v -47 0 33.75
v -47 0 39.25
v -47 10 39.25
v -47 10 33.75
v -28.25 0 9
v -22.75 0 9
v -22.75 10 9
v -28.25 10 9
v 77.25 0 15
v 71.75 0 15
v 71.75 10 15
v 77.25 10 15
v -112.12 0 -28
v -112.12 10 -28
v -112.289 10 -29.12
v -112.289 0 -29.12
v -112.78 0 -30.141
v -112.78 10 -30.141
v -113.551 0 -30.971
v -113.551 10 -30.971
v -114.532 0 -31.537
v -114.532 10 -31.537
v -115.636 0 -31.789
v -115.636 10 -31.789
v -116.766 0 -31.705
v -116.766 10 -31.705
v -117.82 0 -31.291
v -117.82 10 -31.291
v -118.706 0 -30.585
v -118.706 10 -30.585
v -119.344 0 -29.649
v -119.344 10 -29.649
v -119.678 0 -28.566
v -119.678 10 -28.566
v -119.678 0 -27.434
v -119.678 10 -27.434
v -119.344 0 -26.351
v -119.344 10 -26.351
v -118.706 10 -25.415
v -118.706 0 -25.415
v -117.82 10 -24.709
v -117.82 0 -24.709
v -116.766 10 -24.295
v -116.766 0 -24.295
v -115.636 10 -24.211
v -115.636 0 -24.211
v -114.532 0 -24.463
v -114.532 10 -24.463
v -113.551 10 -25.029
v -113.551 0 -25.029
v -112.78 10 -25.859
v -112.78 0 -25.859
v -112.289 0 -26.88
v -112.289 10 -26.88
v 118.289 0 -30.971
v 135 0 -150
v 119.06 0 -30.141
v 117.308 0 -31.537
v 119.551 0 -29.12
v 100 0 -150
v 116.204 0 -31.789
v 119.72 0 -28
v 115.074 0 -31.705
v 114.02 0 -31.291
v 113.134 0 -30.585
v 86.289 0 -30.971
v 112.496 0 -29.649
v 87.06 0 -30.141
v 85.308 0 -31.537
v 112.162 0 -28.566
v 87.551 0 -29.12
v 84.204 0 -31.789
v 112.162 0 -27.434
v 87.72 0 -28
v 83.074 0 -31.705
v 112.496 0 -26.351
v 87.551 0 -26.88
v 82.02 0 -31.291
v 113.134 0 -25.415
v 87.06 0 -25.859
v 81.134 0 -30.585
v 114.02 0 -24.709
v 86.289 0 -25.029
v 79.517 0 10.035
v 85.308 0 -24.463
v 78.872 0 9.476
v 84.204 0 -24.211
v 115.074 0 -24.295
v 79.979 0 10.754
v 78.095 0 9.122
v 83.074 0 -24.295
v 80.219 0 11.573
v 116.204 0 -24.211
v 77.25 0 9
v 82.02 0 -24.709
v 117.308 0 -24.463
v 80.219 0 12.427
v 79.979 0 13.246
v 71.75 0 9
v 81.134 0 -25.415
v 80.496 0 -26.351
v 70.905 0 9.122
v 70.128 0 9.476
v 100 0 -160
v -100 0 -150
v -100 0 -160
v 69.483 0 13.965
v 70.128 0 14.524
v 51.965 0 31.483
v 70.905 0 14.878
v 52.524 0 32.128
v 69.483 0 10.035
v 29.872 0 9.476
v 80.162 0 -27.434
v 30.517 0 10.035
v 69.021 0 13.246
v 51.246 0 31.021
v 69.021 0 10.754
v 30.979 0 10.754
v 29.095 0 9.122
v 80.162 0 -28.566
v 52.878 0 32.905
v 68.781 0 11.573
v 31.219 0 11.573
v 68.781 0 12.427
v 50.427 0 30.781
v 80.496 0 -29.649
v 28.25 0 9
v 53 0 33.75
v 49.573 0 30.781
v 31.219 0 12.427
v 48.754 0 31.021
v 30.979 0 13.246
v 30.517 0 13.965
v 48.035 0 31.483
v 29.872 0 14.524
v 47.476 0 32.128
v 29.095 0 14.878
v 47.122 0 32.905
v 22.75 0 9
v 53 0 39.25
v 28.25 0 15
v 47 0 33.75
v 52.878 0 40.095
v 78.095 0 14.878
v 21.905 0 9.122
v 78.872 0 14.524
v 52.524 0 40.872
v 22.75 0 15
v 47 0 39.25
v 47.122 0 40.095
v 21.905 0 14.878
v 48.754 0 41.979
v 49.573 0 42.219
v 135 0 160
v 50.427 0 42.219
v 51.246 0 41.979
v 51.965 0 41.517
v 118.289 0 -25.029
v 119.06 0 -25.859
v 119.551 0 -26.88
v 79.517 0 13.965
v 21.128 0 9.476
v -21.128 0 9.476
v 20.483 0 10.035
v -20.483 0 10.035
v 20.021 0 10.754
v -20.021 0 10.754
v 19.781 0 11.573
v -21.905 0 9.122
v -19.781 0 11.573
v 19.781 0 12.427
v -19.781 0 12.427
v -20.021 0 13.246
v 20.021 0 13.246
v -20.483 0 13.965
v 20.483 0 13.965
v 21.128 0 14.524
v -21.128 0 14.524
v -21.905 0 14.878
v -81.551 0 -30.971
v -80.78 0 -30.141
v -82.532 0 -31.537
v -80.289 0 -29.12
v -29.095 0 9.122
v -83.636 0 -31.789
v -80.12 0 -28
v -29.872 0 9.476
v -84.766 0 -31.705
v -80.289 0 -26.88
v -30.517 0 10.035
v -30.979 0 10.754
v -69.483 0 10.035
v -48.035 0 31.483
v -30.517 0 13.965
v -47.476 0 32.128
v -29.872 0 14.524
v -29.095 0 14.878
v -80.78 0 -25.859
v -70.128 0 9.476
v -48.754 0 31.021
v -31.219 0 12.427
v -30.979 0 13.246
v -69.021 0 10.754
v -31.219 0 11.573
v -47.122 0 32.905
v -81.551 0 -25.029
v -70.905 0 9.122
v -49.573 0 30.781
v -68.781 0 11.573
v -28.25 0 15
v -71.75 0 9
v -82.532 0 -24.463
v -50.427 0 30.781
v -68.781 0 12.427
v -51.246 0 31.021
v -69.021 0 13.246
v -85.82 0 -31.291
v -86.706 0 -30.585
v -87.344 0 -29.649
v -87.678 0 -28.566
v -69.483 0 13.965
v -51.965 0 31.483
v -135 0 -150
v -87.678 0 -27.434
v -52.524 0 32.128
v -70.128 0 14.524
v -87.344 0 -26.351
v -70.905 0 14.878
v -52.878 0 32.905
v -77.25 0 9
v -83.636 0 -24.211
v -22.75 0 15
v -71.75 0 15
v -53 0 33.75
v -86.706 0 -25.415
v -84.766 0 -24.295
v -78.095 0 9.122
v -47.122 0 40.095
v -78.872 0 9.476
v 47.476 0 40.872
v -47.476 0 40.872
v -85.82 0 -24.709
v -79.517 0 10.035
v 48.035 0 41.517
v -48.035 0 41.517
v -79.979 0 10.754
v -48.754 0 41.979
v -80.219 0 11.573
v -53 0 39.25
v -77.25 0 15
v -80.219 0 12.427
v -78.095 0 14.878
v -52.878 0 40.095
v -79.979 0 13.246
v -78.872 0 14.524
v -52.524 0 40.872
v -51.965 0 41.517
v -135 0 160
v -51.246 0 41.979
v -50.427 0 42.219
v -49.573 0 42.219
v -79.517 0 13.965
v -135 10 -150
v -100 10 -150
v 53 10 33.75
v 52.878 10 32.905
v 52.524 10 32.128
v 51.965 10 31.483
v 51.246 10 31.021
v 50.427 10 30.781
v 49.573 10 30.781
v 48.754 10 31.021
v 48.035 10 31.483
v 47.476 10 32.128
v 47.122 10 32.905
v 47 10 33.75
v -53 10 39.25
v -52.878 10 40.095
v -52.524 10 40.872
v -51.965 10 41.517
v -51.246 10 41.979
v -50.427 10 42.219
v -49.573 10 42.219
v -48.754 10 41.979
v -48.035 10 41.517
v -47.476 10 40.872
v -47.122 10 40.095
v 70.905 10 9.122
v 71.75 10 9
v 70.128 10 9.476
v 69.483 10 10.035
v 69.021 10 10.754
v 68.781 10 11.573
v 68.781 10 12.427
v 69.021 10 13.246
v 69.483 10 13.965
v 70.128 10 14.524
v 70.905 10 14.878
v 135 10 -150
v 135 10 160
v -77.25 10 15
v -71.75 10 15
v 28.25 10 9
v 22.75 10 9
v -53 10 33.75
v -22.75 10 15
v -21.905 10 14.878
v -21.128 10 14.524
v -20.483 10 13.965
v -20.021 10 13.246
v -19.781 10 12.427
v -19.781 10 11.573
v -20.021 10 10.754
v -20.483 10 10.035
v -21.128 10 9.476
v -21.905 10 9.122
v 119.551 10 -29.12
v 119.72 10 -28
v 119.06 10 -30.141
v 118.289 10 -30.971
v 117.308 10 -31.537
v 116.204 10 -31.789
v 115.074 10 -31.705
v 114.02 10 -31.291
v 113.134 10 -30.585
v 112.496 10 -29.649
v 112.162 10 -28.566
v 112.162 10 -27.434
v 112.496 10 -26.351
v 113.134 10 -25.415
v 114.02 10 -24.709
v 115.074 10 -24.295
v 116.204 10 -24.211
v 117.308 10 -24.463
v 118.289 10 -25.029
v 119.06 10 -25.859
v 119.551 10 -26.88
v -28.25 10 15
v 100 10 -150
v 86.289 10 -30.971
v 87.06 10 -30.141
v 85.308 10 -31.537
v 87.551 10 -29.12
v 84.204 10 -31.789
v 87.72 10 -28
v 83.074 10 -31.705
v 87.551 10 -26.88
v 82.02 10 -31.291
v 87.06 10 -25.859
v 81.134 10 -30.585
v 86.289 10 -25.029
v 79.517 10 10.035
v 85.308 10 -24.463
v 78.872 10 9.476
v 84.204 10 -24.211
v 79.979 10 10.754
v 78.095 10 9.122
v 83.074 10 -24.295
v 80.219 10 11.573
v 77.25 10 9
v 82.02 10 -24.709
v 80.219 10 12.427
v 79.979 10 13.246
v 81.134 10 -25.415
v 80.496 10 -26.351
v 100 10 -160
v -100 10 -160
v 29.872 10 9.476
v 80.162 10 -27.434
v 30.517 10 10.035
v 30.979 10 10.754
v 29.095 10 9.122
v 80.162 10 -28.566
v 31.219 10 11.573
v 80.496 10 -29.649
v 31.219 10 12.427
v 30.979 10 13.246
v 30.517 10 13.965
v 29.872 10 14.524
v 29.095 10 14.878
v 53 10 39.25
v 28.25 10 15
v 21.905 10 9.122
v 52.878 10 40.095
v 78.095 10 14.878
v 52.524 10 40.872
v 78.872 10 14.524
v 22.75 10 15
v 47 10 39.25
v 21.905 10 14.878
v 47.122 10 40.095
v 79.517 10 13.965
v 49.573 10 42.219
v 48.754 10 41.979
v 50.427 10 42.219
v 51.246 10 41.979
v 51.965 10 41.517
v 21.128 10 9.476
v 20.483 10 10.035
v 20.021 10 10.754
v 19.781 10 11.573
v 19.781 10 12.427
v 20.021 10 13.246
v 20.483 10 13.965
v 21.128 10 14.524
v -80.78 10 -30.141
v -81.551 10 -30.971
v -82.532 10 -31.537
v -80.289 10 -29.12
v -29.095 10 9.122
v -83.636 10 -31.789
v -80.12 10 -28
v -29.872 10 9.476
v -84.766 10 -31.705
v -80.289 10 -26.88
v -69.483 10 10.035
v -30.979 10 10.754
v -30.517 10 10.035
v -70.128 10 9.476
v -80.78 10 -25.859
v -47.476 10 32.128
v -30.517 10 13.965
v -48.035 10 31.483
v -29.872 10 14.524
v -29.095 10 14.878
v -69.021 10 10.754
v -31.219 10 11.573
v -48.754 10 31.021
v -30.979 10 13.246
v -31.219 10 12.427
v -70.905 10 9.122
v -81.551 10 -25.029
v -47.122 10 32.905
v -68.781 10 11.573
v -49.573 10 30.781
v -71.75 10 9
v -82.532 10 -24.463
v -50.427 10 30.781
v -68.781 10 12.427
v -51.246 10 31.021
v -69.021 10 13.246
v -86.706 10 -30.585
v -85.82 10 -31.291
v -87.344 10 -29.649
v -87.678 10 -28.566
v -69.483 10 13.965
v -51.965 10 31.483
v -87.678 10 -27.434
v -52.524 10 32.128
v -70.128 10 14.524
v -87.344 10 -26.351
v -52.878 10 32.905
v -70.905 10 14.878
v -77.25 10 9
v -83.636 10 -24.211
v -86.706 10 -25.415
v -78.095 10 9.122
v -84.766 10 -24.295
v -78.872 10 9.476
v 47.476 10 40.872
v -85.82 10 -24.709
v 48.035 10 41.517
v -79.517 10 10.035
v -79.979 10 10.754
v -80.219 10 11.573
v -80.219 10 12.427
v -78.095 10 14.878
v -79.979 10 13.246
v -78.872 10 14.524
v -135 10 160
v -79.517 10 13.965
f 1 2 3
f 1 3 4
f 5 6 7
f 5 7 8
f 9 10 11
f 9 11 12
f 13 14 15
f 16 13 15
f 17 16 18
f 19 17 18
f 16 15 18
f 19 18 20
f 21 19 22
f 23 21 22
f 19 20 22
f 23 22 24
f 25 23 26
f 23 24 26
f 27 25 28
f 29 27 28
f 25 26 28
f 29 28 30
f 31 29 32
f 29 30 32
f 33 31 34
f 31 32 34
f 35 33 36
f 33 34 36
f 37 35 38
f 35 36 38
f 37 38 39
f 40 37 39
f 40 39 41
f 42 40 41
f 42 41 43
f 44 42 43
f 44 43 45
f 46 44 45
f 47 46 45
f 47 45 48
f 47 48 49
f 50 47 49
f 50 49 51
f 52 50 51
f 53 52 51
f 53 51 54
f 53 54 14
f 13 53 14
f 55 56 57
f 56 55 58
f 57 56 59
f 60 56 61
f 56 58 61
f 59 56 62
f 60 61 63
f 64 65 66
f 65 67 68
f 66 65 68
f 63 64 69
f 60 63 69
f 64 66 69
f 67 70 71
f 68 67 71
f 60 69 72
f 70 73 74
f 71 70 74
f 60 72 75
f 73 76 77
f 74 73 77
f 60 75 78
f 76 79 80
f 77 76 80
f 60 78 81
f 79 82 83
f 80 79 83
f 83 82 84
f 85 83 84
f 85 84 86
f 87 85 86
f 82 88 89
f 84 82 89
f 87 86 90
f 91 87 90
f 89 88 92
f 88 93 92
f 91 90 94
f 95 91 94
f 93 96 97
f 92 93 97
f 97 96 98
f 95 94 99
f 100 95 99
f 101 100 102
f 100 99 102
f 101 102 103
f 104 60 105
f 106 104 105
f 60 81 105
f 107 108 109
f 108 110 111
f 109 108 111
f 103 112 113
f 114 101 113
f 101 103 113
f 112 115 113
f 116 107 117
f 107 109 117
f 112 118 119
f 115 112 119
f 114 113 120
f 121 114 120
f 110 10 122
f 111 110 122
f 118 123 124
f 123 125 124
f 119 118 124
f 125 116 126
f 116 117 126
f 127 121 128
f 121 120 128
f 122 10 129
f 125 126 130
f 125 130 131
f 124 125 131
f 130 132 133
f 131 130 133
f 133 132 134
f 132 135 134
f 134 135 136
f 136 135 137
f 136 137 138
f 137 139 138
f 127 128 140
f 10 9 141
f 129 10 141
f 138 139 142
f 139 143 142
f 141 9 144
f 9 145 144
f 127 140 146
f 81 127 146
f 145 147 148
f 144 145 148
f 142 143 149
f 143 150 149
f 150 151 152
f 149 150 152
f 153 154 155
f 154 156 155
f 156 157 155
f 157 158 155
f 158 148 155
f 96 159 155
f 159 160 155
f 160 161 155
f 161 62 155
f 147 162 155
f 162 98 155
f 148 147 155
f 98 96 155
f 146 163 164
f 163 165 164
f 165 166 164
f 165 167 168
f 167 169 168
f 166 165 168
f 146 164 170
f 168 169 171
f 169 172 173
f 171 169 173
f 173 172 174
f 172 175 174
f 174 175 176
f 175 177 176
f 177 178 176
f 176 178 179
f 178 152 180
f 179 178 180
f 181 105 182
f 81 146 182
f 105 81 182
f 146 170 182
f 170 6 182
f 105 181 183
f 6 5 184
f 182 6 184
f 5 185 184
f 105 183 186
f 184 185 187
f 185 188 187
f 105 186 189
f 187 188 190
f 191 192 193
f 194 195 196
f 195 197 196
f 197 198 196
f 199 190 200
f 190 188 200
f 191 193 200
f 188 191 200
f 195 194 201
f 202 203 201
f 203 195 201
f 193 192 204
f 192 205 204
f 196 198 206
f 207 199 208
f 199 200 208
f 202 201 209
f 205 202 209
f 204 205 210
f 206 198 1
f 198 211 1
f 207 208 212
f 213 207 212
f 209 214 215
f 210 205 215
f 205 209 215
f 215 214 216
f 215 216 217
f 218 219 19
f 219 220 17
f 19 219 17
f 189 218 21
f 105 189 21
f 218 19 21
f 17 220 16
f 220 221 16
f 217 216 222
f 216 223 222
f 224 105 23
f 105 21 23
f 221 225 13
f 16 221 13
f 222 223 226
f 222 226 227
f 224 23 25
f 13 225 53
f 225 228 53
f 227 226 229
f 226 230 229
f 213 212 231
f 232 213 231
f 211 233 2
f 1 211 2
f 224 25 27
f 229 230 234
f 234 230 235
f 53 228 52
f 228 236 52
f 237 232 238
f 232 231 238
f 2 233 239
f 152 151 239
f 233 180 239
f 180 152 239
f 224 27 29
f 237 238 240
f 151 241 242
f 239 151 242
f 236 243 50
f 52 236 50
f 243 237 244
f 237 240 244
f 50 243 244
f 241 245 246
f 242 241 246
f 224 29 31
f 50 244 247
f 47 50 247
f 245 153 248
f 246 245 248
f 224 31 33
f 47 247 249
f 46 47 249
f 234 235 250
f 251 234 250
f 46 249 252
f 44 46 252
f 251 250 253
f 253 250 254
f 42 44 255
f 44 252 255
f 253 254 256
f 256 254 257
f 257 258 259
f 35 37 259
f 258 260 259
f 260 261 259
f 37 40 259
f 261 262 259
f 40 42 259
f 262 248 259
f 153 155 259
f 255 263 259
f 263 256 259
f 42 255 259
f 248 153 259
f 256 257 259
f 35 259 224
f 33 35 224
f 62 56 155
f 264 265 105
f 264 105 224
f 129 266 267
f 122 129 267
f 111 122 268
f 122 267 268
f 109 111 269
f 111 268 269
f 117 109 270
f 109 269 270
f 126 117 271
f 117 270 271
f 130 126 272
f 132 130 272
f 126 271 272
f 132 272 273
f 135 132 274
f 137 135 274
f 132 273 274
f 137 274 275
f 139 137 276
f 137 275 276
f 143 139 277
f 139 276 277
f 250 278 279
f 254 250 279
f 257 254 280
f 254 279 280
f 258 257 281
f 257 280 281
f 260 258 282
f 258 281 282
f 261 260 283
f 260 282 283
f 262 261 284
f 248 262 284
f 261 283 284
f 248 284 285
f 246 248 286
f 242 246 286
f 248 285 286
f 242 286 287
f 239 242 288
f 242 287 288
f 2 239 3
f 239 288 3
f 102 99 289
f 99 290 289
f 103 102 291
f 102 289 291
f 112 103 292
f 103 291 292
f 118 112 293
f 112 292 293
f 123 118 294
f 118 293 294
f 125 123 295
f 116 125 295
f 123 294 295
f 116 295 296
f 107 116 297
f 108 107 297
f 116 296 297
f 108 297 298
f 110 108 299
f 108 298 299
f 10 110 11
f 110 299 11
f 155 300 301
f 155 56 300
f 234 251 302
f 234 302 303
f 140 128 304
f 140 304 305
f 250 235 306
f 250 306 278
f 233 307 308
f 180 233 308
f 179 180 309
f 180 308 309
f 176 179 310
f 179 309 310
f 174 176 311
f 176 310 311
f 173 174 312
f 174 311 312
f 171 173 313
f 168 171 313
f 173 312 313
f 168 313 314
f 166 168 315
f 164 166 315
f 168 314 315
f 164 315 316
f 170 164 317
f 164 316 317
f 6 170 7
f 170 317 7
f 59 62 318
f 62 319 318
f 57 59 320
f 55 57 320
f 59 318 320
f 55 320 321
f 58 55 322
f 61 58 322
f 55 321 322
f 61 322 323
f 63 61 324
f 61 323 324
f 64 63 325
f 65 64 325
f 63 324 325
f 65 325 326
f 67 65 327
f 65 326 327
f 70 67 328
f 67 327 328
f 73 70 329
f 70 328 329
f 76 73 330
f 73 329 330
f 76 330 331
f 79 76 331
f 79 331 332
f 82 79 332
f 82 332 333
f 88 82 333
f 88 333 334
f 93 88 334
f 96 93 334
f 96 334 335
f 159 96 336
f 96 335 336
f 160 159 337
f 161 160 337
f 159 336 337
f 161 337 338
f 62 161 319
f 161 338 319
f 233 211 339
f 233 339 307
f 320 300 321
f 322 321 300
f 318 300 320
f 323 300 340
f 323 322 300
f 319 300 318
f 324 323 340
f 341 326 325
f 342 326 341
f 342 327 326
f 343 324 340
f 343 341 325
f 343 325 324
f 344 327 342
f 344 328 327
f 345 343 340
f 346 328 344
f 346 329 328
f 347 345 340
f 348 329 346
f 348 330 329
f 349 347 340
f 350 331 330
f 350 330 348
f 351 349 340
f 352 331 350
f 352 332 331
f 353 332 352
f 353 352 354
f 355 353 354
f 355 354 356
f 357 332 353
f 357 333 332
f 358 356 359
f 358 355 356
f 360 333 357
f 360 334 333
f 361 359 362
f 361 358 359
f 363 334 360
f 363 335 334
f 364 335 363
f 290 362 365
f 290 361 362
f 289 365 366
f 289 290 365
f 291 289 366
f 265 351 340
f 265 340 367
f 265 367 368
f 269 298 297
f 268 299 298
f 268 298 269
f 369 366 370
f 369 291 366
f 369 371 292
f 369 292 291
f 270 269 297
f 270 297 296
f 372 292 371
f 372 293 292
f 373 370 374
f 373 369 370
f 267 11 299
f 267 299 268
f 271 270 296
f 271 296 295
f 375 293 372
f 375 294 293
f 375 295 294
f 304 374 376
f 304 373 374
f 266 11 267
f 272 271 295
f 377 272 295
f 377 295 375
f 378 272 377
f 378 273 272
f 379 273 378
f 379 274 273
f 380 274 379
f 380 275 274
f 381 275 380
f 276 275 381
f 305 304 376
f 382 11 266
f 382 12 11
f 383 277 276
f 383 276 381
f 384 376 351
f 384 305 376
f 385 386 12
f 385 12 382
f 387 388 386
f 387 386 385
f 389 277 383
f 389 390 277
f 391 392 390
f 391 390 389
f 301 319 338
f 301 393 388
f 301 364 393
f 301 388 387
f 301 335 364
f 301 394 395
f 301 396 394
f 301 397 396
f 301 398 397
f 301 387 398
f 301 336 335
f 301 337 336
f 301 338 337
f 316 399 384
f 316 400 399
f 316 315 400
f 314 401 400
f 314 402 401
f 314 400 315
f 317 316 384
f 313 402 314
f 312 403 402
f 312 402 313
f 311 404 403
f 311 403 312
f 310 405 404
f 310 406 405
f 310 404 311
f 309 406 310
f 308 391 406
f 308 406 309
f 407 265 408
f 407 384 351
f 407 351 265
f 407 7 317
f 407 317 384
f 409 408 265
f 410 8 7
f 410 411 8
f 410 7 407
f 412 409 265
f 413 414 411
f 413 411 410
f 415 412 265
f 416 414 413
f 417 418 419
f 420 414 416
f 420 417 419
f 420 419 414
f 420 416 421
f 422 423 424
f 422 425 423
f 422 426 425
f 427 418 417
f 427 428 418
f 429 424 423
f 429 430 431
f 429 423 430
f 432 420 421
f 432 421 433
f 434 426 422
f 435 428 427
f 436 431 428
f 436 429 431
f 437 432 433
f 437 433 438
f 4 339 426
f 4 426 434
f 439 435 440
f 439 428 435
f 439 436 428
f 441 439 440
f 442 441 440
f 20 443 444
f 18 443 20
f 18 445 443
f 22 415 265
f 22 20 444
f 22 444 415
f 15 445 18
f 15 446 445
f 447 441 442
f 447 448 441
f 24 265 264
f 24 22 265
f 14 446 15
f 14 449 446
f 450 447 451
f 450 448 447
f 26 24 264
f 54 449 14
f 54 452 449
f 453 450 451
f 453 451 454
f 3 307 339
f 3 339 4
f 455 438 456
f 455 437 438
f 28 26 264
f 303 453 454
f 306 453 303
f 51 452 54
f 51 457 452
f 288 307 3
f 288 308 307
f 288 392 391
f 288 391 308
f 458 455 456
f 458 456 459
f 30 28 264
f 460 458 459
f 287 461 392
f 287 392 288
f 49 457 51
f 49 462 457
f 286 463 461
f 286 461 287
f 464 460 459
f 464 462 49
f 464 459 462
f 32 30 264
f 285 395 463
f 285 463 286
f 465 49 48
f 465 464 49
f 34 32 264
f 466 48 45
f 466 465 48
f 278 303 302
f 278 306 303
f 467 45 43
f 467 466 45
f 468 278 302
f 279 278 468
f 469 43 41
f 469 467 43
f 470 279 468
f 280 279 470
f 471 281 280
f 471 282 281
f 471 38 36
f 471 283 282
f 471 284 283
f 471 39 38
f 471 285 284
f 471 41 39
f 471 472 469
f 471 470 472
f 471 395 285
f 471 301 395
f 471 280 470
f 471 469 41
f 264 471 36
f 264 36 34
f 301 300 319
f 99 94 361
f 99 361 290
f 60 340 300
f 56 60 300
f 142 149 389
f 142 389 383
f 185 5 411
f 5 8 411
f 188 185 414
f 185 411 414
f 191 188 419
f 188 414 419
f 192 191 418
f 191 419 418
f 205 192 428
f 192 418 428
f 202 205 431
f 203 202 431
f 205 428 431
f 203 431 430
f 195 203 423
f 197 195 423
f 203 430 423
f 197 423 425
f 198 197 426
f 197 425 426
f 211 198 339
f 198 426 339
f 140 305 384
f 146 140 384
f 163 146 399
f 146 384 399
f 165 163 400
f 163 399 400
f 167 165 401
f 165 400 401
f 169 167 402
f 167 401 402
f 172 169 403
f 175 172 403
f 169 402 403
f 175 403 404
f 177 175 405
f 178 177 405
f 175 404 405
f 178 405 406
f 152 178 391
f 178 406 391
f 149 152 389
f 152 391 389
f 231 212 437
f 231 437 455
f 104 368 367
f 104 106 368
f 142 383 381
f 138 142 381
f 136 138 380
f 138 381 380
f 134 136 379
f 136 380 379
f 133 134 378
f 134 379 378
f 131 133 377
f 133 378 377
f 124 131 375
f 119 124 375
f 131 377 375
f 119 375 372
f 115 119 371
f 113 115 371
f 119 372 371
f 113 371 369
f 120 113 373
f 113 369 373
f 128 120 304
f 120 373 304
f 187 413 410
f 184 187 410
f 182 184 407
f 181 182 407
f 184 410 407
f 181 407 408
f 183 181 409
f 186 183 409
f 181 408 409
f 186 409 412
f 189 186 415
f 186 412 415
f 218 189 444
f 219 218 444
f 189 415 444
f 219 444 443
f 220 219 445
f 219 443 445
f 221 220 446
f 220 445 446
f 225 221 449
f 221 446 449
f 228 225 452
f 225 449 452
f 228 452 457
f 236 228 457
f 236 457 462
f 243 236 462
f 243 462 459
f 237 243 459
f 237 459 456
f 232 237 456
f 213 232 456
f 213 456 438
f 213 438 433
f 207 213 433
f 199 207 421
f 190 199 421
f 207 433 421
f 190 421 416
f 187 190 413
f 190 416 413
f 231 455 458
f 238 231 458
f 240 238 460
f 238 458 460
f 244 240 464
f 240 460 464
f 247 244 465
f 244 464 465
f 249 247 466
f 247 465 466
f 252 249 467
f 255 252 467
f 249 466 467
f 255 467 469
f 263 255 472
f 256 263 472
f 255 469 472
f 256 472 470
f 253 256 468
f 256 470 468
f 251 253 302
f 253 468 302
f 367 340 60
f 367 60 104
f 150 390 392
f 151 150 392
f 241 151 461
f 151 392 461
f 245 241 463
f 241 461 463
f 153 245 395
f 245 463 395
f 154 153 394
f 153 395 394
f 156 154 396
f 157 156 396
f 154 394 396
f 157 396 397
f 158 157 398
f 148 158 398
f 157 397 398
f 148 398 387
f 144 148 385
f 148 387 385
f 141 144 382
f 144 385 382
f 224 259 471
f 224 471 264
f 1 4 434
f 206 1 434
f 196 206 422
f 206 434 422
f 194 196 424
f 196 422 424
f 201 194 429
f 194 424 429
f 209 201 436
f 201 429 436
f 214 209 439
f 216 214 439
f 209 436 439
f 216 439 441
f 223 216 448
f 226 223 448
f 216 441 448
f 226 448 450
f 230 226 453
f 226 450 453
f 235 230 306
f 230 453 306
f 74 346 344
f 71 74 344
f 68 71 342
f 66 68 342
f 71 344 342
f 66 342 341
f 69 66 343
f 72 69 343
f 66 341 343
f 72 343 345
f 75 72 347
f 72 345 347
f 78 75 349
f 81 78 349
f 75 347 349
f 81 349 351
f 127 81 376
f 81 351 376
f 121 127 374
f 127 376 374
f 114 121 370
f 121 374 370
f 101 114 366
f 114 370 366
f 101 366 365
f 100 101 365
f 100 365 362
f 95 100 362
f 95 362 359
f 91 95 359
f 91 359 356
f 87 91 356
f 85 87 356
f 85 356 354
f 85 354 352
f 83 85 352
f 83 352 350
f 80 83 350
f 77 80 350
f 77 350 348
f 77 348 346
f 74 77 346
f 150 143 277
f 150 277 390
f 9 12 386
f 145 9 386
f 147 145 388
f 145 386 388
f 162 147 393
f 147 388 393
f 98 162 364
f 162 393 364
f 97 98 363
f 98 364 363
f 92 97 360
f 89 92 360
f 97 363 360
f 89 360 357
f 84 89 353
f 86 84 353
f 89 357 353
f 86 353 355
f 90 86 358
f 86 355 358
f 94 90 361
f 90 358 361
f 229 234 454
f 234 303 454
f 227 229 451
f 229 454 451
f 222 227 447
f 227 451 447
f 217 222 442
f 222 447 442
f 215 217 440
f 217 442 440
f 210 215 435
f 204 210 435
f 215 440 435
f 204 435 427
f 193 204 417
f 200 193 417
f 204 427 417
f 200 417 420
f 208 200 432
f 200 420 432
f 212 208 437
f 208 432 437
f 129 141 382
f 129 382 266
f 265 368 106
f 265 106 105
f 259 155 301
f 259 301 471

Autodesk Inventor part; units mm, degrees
ref_plane "YZ Plane" through (0, 0, 0) normal (1, 0, 0) x (0, 1, 0)
ref_plane "XZ Plane" through (0, 0, 0) normal (0, 1, 0) x (-1, 0, 0)
ref_plane "XY Plane" through (0, 0, 0) normal (0, 0, 1) x (1, 0, 0)
sketch "Sketch1" plane through (0, 0, 0) normal (0, 1, 0) x (-1, 0, 0)
  line L0 (-135, 160) -> (135, 160)
  line L1 (135, 160) -> (135, -160)
  line L2 (135, -160) -> (-135, -160)
  line L3 (-135, -160) -> (-135, 160)
  line L4 (-135, 160) -> (135, -160) construction
  line L5 (135, 160) -> (-135, -160) construction
  point P0 (0, 0)
  dimension "d0" = 270
  dimension "d1" = 320
extrude "Extrusion1" add sketch "Sketch1" along normal blind 10
sketch "Sketch2" plane through (0, 10, 0) normal (0, 1, 0) x (1, 0, 0)
  line L0 (57, -25.5) -> (57, -50) projected
  line L1 (57, -25.5) -> (43, -25.5) projected
  line L2 (43, -50) -> (43, -25.5) projected
  line L3 (57, -50) -> (43, -50) projected
  arc A0 (53, -33.75) -> (47, -33.75) centre (50, -33.75) ccw projected
  line L4 (53, -39.25) -> (53, -33.75) projected
  arc A1 (47, -39.25) -> (53, -39.25) centre (50, -39.25) ccw projected
  line L5 (47, -33.75) -> (47, -39.25) projected
  line L6 (63.5, -5) -> (88, -5) projected
  line L7 (63.5, -5) -> (63.5, -19) projected
  line L8 (88, -19) -> (63.5, -19) projected
  line L9 (88, -5) -> (88, -19) projected
  arc A2 (71.75, -9) -> (71.75, -15) centre (71.75, -12) ccw projected
  line L10 (77.25, -9) -> (71.75, -9) projected
  arc A3 (77.25, -15) -> (77.25, -9) centre (77.25, -12) ccw projected
  line L11 (71.75, -15) -> (77.25, -15) projected
  line L12 (36.5, -19) -> (12, -19) projected
  line L13 (36.5, -19) -> (36.5, -5) projected
  line L14 (12, -5) -> (36.5, -5) projected
  line L15 (12, -19) -> (12, -5) projected
  arc A4 (28.25, -15) -> (28.25, -9) centre (28.25, -12) ccw projected
  line L16 (22.75, -15) -> (28.25, -15) projected
  arc A5 (22.75, -9) -> (22.75, -15) centre (22.75, -12) ccw projected
  line L17 (28.25, -9) -> (22.75, -9) projected
  line L18 (-36.5, -5) -> (-12, -5) projected
  line L19 (-36.5, -5) -> (-36.5, -19) projected
  line L20 (-12, -19) -> (-36.5, -19) projected
  line L21 (-12, -5) -> (-12, -19) projected
  arc A6 (-28.25, -9) -> (-28.25, -15) centre (-28.25, -12) ccw projected
  line L22 (-22.75, -9) -> (-28.25, -9) projected
  arc A7 (-22.75, -15) -> (-22.75, -9) centre (-22.75, -12) ccw projected
  line L23 (-28.25, -15) -> (-22.75, -15) projected
  line L24 (-43, -25.5) -> (-43, -50) projected
  line L25 (-43, -25.5) -> (-57, -25.5) projected
  line L26 (-57, -50) -> (-57, -25.5) projected
  line L27 (-43, -50) -> (-57, -50) projected
  arc A8 (-47, -33.75) -> (-53, -33.75) centre (-50, -33.75) ccw projected
  line L28 (-47, -39.25) -> (-47, -33.75) projected
  arc A9 (-53, -39.25) -> (-47, -39.25) centre (-50, -39.25) ccw projected
  line L29 (-53, -33.75) -> (-53, -39.25) projected
  line L30 (-63.5, -19) -> (-88, -19) projected
  line L31 (-63.5, -19) -> (-63.5, -5) projected
  line L32 (-88, -5) -> (-63.5, -5) projected
  line L33 (-88, -19) -> (-88, -5) projected
  arc A10 (-71.75, -15) -> (-71.75, -9) centre (-71.75, -12) ccw projected
  line L34 (-77.25, -15) -> (-71.75, -15) projected
  arc A11 (-77.25, -9) -> (-77.25, -15) centre (-77.25, -12) ccw projected
  line L35 (-71.75, -9) -> (-77.25, -9) projected
  line L36 (-108.92, 42.1) -> (-108.92, 39.2309) projected
  line L37 (-108.52, 39) -> (-108.92, 39.2309) projected
  line L38 (-108.92, 38.7691) -> (-108.52, 39) projected
  line L39 (-108.92, 38.7691) -> (-108.92, 35.0867) projected
  line L40 (-108.92, 35.0867) -> (-117.2017, 32.9363) projected
  arc A12 (-117.2017, 32.9363) -> (-117.2017, 23.0637) centre (-115.92, 28) ccw projected
  line L41 (-117.2017, 23.0637) -> (-101.7351, 19.0476) projected
  arc A13 (-101.7351, 19.0476) -> (-100.579, 18.9) centre (-100.579, 23.5) ccw projected
  line L42 (-100.579, 18.9) -> (-99.2609, 18.9) projected
  arc A14 (-99.2609, 18.9) -> (-98.1048, 19.0476) centre (-99.2609, 23.5) ccw projected
  line L43 (-98.1048, 19.0476) -> (-82.6382, 23.0637) projected
  arc A15 (-82.6382, 23.0637) -> (-82.6382, 32.9363) centre (-83.92, 28) ccw projected
  line L44 (-82.6382, 32.9363) -> (-90.92, 35.0867) projected
  line L45 (-90.92, 42.1) -> (-90.92, 35.0867) projected
  line L46 (-90.92, 42.1) -> (-99.195, 42.1) projected
  line L47 (-99.195, 32.3399) -> (-99.195, 42.1) projected
  arc A16 (-100.645, 32.3399) -> (-99.195, 32.3399) centre (-99.92, 28) ccw projected
  line L48 (-100.645, 32.3399) -> (-100.645, 42.1) projected
  line L49 (-100.645, 42.1) -> (-108.92, 42.1) projected
  circle A17 centre (-115.92, 28) radius 3.8 projected
  circle A18 centre (-83.92, 28) radius 3.8 projected
  line L50 (90.92, 42.1) -> (90.92, 39.2309) projected
  line L51 (91.32, 39) -> (90.92, 39.2309) projected
  line L52 (90.92, 38.7691) -> (91.32, 39) projected
  line L53 (90.92, 38.7691) -> (90.92, 35.0867) projected
  line L54 (90.92, 35.0867) -> (82.6382, 32.9363) projected
  arc A19 (82.6382, 32.9363) -> (82.6382, 23.0637) centre (83.92, 28) ccw projected
  line L55 (82.6382, 23.0637) -> (98.1048, 19.0476) projected
  arc A20 (98.1048, 19.0476) -> (99.2609, 18.9) centre (99.2609, 23.5) ccw projected
  line L56 (99.2609, 18.9) -> (100.579, 18.9) projected
  arc A21 (100.579, 18.9) -> (101.7351, 19.0476) centre (100.579, 23.5) ccw projected
  line L57 (101.7351, 19.0476) -> (117.2017, 23.0637) projected
  arc A22 (117.2017, 23.0637) -> (117.2017, 32.9363) centre (115.92, 28) ccw projected
  line L58 (117.2017, 32.9363) -> (108.92, 35.0867) projected
  line L59 (108.92, 42.1) -> (108.92, 35.0867) projected
  line L60 (108.92, 42.1) -> (100.645, 42.1) projected
  line L61 (100.645, 32.3399) -> (100.645, 42.1) projected
  arc A23 (99.195, 32.3399) -> (100.645, 32.3399) centre (99.92, 28) ccw projected
  line L62 (99.195, 32.3399) -> (99.195, 42.1) projected
  line L63 (99.195, 42.1) -> (90.92, 42.1) projected
  circle A24 centre (83.92, 28) radius 3.8 projected
  circle A25 centre (115.92, 28) radius 3.8 projected
  point P0 (0, 0)
extrude "Extrusion2" cut sketch "Sketch2" against normal blind 10 contours L4 A1 L5 A0 | L10 A3 L11 A2 | L16 A5 L17 A4 | L22 A7 L23 A6 | L28 A9 L29 A8 | L34 A11 L35 A10 | A17 | A18 | A24 | A25
sketch "Sketch3" plane through (0, 10, 0) normal (0, 1, 0) x (1, 0, 0)
  arc A0 (-77.25, -9) -> (-77.25, -15) centre (-77.25, -12) ccw projected
  line L0 (-77.25, -9) -> (-71.75, -9) projected
  arc A1 (-71.75, -15) -> (-71.75, -9) centre (-71.75, -12) ccw projected
  line L1 (-71.75, -15) -> (-77.25, -15) projected
  circle A2 centre (83.92, 28) radius 3.8 projected
  circle A3 centre (-115.92, 28) radius 3.8 projected
  arc A4 (77.25, -15) -> (77.25, -9) centre (77.25, -12) ccw projected
  line L2 (77.25, -15) -> (71.75, -15) projected
  arc A5 (71.75, -9) -> (71.75, -15) centre (71.75, -12) ccw projected
  line L3 (71.75, -9) -> (77.25, -9) projected
  arc A6 (-22.75, -15) -> (-22.75, -9) centre (-22.75, -12) ccw projected
  line L4 (-22.75, -15) -> (-28.25, -15) projected
  arc A7 (-28.25, -9) -> (-28.25, -15) centre (-28.25, -12) ccw projected
  line L5 (-28.25, -9) -> (-22.75, -9) projected
  arc A8 (47, -39.25) -> (53, -39.25) centre (50, -39.25) ccw projected
  line L6 (47, -39.25) -> (47, -33.75) projected
  arc A9 (53, -33.75) -> (47, -33.75) centre (50, -33.75) ccw projected
  line L7 (53, -33.75) -> (53, -39.25) projected
  circle A10 centre (115.92, 28) radius 3.8 projected
  circle A11 centre (-83.92, 28) radius 3.8 projected
  arc A12 (22.75, -9) -> (22.75, -15) centre (22.75, -12) ccw projected
  line L8 (22.75, -9) -> (28.25, -9) projected
  arc A13 (28.25, -15) -> (28.25, -9) centre (28.25, -12) ccw projected
  line L9 (28.25, -15) -> (22.75, -15) projected
  arc A14 (-53, -39.25) -> (-47, -39.25) centre (-50, -39.25) ccw projected
  line L10 (-53, -39.25) -> (-53, -33.75) projected
  arc A15 (-47, -33.75) -> (-53, -33.75) centre (-50, -33.75) ccw projected
  line L11 (-47, -33.75) -> (-47, -39.25) projected
  line L12 (135, 160) -> (-135, 160) projected
  line L13 (-135, 160) -> (-135, -160) projected
  line L14 (-135, -160) -> (135, -160) projected
  line L15 (135, -160) -> (135, 160) projected
  line L16 (100, 170) -> (-100, 170)
  line L17 (-100, 170) -> (-100, 150)
  line L18 (-100, 150) -> (100, 150)
  line L19 (100, 150) -> (100, 170)
  line L20 (135, 160) -> (-135, 160) projected
  line L21 (100, 170) -> (-100, 150) construction
  line L22 (-100, 170) -> (100, 150) construction
  line L23 (-100, 150) -> (-135, 150)
  line L24 (-135, 160) -> (-135, -160) projected
  line L25 (100, 150) -> (135, 150)
  point P0 (0, 0)
  point P1 (0, 160)
  point P2 (-100, 160)
  point P3 (100, 160)
  dimension "d6" = 10
  dimension "d7" = 200
extrude "Extrusion3" cut sketch "Sketch3" against normal blind 49.25 contours L15 L25 L19 L12 | L17 L23 L13 L12
properties part number "12_Tam_go_top" material "Glass"
